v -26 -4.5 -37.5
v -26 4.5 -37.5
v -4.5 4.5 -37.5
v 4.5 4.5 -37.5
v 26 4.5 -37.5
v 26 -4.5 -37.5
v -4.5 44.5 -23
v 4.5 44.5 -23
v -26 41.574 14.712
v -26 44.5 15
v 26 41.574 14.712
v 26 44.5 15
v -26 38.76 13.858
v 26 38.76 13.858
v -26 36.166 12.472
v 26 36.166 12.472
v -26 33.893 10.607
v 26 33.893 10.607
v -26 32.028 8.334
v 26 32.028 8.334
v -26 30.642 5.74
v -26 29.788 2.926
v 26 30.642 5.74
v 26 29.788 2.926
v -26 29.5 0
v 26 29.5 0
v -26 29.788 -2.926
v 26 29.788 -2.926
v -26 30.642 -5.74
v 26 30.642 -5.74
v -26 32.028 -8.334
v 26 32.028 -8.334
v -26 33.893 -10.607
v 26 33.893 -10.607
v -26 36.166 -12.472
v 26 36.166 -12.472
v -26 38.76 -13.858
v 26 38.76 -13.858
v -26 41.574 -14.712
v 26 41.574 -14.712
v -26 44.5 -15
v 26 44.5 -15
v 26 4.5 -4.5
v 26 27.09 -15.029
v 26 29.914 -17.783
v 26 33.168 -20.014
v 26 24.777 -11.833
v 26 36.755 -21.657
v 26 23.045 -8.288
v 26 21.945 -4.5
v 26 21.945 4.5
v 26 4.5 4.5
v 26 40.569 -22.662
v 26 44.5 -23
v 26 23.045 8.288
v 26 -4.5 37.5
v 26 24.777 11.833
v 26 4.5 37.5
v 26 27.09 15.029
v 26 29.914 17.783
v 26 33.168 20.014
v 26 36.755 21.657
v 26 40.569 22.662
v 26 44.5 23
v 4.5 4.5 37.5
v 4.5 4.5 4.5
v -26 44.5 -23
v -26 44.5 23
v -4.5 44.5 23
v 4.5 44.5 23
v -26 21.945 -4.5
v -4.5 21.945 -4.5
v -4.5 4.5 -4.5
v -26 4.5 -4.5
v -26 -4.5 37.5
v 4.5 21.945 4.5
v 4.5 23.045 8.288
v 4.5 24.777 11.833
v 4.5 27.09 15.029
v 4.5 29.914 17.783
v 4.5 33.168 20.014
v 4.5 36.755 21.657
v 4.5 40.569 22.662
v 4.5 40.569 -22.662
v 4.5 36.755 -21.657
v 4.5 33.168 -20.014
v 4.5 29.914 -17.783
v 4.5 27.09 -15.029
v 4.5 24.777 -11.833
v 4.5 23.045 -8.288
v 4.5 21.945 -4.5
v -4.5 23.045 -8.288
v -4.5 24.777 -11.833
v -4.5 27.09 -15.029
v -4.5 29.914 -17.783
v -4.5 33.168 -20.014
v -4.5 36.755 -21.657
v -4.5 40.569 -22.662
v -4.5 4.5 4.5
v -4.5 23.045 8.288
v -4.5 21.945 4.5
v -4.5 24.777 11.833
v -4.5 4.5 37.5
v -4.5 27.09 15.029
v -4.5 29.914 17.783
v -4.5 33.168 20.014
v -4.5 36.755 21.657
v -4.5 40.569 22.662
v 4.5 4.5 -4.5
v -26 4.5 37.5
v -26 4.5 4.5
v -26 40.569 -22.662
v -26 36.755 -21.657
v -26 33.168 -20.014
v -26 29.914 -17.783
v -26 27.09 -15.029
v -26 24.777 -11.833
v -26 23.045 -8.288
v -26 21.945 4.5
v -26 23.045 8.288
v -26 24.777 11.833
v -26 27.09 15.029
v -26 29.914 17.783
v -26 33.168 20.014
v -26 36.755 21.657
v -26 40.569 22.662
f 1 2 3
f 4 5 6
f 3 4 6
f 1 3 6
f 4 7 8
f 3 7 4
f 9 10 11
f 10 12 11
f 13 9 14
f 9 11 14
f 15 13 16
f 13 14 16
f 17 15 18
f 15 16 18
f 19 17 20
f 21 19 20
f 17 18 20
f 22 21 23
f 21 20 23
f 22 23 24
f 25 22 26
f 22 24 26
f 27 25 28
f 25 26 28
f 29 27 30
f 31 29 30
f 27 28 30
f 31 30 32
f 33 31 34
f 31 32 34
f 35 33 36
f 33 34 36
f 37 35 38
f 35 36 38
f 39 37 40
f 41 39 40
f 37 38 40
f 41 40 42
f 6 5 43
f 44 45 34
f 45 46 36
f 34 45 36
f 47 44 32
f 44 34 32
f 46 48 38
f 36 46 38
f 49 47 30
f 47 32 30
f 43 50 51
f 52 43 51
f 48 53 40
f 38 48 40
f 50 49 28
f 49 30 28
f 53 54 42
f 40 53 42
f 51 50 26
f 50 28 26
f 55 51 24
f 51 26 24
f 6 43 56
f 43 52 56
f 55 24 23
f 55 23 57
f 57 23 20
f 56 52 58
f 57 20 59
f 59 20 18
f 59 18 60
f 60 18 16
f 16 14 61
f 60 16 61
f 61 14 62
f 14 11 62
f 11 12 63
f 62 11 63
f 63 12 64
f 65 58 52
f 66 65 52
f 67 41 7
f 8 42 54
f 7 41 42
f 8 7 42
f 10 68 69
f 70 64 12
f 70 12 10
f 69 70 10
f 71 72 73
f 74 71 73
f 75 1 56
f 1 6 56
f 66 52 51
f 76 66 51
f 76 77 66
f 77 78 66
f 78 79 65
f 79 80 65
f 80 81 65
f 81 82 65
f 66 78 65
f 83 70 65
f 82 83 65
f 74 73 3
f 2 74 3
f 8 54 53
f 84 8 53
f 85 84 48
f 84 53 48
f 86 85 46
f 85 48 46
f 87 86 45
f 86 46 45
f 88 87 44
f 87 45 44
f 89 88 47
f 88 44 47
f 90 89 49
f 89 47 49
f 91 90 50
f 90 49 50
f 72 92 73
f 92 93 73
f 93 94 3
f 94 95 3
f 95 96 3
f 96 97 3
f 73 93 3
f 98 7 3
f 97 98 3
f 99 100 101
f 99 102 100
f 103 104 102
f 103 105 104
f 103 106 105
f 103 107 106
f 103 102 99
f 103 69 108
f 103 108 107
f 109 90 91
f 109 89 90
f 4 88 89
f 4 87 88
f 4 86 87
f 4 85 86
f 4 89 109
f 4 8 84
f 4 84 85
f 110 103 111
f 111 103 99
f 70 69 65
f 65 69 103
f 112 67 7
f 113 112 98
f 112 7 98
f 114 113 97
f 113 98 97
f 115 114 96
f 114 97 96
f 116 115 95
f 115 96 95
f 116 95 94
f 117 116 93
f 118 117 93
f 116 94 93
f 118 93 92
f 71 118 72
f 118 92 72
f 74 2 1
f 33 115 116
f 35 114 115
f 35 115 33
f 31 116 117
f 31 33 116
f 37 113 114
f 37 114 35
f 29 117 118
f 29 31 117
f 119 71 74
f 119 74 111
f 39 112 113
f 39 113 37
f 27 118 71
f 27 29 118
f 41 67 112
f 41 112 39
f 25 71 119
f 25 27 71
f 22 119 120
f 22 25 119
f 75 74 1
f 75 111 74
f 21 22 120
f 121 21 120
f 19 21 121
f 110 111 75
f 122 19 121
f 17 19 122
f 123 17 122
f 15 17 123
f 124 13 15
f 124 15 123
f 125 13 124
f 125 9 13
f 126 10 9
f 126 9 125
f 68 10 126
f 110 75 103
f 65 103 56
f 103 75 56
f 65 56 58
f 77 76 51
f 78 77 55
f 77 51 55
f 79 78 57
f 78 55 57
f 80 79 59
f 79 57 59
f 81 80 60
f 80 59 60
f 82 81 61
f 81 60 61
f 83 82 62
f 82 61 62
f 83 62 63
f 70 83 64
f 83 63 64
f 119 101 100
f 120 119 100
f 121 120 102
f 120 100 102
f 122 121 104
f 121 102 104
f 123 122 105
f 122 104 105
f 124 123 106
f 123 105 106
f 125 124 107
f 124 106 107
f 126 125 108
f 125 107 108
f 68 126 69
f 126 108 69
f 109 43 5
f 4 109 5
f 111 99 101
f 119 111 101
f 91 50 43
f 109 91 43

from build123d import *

# Parameters (mm, degrees)
BOSS_EXTRUDE1_DEPTH = 26
RIB9_REACH          = 65.738
SKETCH6_WALL_W      = 172.022520638
SKETCH6_WALL_H      = 9


with BuildPart() as part:
    # Sketch1 → Boss-Extrude1 (new, symmetric)
    with BuildSketch(Plane(origin=(0, 0, 0), x_dir=(0, 0, -1), z_dir=(1, 0, 0))):
        with BuildLine():
            Line((-23, 44.5), (-15, 44.5))
            ThreePointArc((-15, 44.5), (0, 29.5), (15, 44.5))
            Line((15, 44.5), (23, 44.5))
            ThreePointArc((23, 44.5), (17.783419244, 29.914047854), (4.5, 21.944512863))
            Line((4.5, 21.944512863), (4.5, 4.5))
            Line((4.5, 4.5), (37.5, 4.5))
            Line((37.5, 4.5), (37.5, -4.5))
            Line((37.5, -4.5), (-37.5, -4.5))
            Line((-37.5, -4.5), (-37.5, 4.5))
            Line((-37.5, 4.5), (-4.5, 4.5))
            Line((-4.5, 4.5), (-4.5, 21.944512863))
            ThreePointArc((-4.5, 21.944512863), (-17.783419244, 29.914047854), (-23, 44.5))
        make_face()
    extrude(amount=BOSS_EXTRUDE1_DEPTH, both=True)

    # Sketch6 wall → Rib9 (add, up to next)
    with BuildSketch(Plane(origin=(0, 24.5, -30.25), x_dir=(0, -0.940136065162, -0.340799323621), z_dir=(0, 0.340799323621, -0.940136065162)), mode=Mode.PRIVATE) as rib9_sk1:
        Rectangle(SKETCH6_WALL_W, SKETCH6_WALL_H)
    rib9_tool1 = extrude(rib9_sk1.sketch, amount=-RIB9_REACH, mode=Mode.PRIVATE) - part.part
    rib9 = rib9_tool1.solids().sort_by_distance((0, 24.5, -30.25))[0]
    add(rib9)

    # Mirror1: Rib9 across plane
    add(rib9.mirror(Plane.XY))


solid = part.part
